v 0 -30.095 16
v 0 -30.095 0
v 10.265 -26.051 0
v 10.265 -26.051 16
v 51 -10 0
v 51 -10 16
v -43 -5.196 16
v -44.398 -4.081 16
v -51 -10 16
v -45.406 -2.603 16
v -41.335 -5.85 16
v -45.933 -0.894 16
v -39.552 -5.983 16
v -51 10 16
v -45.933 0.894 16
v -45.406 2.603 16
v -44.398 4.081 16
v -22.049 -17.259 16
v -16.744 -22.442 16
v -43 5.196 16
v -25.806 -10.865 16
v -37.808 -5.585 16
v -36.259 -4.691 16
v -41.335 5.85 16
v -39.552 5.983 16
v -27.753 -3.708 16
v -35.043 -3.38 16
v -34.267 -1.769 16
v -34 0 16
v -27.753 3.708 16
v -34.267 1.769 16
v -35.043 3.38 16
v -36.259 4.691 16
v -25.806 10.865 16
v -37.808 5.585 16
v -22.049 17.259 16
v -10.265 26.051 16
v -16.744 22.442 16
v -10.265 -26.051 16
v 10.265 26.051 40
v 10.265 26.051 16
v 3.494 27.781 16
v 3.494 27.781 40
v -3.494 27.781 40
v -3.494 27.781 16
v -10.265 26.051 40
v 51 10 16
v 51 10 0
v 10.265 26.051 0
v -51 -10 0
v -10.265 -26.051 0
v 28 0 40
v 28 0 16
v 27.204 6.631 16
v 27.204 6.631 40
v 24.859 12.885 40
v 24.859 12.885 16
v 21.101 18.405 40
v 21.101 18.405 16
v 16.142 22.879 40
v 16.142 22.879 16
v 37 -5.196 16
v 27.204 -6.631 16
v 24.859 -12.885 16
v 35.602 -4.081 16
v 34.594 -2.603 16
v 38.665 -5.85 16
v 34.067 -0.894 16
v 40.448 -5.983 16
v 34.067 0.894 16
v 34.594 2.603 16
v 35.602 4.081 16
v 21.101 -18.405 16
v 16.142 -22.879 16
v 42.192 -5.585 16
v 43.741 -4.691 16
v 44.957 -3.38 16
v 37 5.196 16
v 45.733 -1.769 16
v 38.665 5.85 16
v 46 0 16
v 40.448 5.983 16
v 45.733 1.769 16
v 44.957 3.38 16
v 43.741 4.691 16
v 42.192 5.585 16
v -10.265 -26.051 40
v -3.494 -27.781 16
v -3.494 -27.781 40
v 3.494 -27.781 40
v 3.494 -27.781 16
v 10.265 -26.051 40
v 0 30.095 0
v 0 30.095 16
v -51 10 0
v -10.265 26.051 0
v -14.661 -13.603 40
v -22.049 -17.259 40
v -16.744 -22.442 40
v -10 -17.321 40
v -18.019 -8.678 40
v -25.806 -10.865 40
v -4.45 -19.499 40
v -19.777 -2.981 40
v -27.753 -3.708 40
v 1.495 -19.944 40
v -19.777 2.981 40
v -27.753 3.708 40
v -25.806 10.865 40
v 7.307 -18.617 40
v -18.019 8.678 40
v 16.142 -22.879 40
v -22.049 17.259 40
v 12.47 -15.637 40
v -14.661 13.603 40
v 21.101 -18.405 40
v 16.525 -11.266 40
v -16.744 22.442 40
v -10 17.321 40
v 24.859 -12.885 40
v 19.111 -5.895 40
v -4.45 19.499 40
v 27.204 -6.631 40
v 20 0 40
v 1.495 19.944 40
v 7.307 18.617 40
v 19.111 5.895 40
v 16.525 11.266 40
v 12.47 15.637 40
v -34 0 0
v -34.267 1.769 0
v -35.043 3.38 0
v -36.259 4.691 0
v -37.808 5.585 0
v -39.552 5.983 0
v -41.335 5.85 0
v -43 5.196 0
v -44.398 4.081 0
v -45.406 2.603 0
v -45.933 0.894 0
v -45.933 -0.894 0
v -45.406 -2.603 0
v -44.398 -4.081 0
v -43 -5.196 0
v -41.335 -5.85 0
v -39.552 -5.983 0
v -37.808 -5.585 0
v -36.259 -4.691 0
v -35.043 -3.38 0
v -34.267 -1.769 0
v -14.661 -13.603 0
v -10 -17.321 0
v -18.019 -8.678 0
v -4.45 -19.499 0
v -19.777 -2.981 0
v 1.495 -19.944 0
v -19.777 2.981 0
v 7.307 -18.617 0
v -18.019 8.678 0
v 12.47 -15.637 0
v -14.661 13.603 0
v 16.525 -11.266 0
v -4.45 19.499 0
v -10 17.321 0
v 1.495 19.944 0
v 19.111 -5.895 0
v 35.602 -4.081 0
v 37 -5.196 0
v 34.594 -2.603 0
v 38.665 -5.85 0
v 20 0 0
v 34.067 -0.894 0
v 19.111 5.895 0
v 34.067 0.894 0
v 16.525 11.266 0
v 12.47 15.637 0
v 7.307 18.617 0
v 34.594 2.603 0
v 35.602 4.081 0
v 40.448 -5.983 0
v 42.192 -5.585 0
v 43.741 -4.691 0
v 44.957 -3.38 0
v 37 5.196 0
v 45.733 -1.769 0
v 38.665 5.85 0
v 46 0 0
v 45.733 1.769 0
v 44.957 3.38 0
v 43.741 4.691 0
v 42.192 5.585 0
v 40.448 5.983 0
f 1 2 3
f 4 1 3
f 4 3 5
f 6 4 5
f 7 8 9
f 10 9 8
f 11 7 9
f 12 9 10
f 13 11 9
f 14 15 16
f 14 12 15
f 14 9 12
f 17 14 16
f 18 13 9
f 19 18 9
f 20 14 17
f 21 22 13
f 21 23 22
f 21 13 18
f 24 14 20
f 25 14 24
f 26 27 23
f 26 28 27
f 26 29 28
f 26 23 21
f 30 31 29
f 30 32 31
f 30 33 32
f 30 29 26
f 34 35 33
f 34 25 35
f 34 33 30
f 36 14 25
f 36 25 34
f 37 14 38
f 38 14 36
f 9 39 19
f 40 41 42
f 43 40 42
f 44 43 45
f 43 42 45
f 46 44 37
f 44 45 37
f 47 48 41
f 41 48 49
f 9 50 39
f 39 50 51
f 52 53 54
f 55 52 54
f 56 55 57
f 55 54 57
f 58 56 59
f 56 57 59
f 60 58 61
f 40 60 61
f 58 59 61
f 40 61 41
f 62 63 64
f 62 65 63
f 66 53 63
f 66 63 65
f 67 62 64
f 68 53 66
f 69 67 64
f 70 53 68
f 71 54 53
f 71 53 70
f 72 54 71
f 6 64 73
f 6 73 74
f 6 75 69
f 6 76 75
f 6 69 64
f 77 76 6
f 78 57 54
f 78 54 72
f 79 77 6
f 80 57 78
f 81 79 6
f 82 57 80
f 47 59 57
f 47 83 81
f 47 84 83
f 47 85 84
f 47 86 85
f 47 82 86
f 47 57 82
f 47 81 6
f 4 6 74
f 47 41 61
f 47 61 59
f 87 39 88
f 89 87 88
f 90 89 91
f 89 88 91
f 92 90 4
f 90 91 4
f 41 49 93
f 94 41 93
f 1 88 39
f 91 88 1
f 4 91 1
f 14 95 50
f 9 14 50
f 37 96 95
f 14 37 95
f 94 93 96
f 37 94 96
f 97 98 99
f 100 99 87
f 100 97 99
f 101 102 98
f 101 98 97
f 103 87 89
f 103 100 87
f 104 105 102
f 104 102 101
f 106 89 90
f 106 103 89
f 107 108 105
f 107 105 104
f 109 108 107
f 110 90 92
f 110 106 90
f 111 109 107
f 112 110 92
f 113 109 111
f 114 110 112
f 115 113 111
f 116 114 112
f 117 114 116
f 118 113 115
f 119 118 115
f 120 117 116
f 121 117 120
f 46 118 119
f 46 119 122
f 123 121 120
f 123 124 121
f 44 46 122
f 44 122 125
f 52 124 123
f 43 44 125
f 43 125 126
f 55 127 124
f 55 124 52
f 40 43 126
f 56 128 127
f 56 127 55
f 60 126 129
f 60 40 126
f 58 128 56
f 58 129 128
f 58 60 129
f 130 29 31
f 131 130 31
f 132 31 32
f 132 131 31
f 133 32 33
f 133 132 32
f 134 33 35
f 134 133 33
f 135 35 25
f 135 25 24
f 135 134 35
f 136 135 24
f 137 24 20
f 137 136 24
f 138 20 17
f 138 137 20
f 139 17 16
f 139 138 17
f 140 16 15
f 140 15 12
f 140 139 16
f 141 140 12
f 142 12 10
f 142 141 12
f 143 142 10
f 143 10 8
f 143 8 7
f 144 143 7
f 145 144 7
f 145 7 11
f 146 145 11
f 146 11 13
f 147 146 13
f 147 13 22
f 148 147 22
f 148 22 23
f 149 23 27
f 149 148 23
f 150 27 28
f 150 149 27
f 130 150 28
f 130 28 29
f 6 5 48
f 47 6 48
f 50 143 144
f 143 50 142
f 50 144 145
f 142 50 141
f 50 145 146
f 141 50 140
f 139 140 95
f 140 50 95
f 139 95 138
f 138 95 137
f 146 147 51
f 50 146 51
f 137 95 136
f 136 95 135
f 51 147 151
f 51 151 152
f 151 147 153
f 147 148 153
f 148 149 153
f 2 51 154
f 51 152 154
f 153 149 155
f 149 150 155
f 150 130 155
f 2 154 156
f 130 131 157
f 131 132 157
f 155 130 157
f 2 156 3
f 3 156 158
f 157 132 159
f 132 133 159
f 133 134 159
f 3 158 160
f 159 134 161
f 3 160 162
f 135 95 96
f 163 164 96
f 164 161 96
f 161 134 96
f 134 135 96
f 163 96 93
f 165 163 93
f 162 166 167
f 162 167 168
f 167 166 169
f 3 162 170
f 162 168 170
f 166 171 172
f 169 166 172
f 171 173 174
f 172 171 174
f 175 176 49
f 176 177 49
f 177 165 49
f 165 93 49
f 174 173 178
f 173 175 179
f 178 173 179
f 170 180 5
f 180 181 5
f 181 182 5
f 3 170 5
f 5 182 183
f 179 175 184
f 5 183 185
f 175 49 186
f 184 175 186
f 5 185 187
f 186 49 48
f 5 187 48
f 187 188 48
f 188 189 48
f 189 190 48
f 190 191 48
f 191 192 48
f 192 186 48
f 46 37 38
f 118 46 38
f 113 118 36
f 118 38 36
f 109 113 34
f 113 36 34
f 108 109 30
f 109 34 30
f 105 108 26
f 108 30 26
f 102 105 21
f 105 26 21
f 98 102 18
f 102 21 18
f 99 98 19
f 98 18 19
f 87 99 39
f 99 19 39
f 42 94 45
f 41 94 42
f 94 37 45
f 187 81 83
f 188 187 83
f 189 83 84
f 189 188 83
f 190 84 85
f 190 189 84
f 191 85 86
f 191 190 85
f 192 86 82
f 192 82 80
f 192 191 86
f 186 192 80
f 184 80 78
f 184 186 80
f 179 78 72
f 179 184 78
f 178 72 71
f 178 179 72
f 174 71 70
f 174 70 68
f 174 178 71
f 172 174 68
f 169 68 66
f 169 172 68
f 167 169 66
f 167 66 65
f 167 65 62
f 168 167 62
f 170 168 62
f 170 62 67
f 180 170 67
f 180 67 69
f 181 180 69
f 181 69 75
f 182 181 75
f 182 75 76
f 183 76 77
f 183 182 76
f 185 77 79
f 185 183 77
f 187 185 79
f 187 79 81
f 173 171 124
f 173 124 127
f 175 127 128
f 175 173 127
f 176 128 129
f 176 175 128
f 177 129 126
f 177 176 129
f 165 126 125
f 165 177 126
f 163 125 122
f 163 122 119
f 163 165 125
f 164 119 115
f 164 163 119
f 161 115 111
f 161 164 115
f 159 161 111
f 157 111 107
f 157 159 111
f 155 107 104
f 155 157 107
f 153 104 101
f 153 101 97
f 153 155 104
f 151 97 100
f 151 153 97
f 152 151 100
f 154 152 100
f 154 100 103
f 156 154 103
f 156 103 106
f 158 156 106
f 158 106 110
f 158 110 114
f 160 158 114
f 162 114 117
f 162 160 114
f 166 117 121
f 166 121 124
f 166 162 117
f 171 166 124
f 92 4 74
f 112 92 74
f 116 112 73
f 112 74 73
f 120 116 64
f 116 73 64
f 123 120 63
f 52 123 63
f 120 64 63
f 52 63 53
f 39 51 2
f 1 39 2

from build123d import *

# Parameters (mm, degrees)
F0_R     = 20
F1_DEPTH = 40
F0_R_2   = 6
F2_DEPTH = 16


with BuildPart() as f1:
    # F0 (on Top) → F1 (new body)
    with BuildSketch(Plane.XY):
        with BuildLine():
            ThreePointArc((10.26457, -26.050693), (23.14528, -15.757412), (28, 0))
            ThreePointArc((28, 0), (23.14528, 15.757412), (10.26457, 26.050693))
            ThreePointArc((10.26457, 26.050693), (0, 28), (-10.26457, 26.050693))
            ThreePointArc((-10.26457, 26.050693), (-28, 0), (-10.26457, -26.050693))
            ThreePointArc((-10.26457, -26.050693), (0, -28), (10.26457, -26.050693))
        make_face()
        Circle(F0_R, mode=Mode.SUBTRACT)
    extrude(amount=F1_DEPTH)

    # F0 (on Top) → F2 (join)
    with BuildSketch(Plane.XY):
        with BuildLine():
            ThreePointArc((10.26457, 26.050693), (23.14528, 15.757412), (28, 0))
            ThreePointArc((28, 0), (23.14528, -15.757412), (10.26457, -26.050693))
            Line((10.26457, -26.050693), (51, -10))
            Line((51, -10), (51, 10))
            Line((51, 10), (10.26457, 26.050693))
        make_face()
        with Locations((40, 0)):
            Circle(F0_R_2, mode=Mode.SUBTRACT)
        with BuildLine():
            ThreePointArc((-10.26457, 26.050693), (0, 28), (10.26457, 26.050693))
            Line((10.26457, 26.050693), (0, 30.095169))
            Line((0, 30.095169), (-10.26457, 26.050693))
        make_face()
        with BuildLine():
            Line((0, -30.095169), (10.26457, -26.050693))
            ThreePointArc((10.26457, -26.050693), (0, -28), (-10.26457, -26.050693))
            Line((-10.26457, -26.050693), (0, -30.095169))
        make_face()
        with BuildLine():
            ThreePointArc((-10.26457, -26.050693), (-28, 0), (-10.26457, 26.050693))
            Line((-10.26457, 26.050693), (-51, 10))
            Line((-51, 10), (-51, -10))
            Line((-51, -10), (-10.26457, -26.050693))
        make_face()
        with Locations((-40, 0)):
            Circle(F0_R_2, mode=Mode.SUBTRACT)
    extrude(amount=F2_DEPTH)


solid = f1.part
